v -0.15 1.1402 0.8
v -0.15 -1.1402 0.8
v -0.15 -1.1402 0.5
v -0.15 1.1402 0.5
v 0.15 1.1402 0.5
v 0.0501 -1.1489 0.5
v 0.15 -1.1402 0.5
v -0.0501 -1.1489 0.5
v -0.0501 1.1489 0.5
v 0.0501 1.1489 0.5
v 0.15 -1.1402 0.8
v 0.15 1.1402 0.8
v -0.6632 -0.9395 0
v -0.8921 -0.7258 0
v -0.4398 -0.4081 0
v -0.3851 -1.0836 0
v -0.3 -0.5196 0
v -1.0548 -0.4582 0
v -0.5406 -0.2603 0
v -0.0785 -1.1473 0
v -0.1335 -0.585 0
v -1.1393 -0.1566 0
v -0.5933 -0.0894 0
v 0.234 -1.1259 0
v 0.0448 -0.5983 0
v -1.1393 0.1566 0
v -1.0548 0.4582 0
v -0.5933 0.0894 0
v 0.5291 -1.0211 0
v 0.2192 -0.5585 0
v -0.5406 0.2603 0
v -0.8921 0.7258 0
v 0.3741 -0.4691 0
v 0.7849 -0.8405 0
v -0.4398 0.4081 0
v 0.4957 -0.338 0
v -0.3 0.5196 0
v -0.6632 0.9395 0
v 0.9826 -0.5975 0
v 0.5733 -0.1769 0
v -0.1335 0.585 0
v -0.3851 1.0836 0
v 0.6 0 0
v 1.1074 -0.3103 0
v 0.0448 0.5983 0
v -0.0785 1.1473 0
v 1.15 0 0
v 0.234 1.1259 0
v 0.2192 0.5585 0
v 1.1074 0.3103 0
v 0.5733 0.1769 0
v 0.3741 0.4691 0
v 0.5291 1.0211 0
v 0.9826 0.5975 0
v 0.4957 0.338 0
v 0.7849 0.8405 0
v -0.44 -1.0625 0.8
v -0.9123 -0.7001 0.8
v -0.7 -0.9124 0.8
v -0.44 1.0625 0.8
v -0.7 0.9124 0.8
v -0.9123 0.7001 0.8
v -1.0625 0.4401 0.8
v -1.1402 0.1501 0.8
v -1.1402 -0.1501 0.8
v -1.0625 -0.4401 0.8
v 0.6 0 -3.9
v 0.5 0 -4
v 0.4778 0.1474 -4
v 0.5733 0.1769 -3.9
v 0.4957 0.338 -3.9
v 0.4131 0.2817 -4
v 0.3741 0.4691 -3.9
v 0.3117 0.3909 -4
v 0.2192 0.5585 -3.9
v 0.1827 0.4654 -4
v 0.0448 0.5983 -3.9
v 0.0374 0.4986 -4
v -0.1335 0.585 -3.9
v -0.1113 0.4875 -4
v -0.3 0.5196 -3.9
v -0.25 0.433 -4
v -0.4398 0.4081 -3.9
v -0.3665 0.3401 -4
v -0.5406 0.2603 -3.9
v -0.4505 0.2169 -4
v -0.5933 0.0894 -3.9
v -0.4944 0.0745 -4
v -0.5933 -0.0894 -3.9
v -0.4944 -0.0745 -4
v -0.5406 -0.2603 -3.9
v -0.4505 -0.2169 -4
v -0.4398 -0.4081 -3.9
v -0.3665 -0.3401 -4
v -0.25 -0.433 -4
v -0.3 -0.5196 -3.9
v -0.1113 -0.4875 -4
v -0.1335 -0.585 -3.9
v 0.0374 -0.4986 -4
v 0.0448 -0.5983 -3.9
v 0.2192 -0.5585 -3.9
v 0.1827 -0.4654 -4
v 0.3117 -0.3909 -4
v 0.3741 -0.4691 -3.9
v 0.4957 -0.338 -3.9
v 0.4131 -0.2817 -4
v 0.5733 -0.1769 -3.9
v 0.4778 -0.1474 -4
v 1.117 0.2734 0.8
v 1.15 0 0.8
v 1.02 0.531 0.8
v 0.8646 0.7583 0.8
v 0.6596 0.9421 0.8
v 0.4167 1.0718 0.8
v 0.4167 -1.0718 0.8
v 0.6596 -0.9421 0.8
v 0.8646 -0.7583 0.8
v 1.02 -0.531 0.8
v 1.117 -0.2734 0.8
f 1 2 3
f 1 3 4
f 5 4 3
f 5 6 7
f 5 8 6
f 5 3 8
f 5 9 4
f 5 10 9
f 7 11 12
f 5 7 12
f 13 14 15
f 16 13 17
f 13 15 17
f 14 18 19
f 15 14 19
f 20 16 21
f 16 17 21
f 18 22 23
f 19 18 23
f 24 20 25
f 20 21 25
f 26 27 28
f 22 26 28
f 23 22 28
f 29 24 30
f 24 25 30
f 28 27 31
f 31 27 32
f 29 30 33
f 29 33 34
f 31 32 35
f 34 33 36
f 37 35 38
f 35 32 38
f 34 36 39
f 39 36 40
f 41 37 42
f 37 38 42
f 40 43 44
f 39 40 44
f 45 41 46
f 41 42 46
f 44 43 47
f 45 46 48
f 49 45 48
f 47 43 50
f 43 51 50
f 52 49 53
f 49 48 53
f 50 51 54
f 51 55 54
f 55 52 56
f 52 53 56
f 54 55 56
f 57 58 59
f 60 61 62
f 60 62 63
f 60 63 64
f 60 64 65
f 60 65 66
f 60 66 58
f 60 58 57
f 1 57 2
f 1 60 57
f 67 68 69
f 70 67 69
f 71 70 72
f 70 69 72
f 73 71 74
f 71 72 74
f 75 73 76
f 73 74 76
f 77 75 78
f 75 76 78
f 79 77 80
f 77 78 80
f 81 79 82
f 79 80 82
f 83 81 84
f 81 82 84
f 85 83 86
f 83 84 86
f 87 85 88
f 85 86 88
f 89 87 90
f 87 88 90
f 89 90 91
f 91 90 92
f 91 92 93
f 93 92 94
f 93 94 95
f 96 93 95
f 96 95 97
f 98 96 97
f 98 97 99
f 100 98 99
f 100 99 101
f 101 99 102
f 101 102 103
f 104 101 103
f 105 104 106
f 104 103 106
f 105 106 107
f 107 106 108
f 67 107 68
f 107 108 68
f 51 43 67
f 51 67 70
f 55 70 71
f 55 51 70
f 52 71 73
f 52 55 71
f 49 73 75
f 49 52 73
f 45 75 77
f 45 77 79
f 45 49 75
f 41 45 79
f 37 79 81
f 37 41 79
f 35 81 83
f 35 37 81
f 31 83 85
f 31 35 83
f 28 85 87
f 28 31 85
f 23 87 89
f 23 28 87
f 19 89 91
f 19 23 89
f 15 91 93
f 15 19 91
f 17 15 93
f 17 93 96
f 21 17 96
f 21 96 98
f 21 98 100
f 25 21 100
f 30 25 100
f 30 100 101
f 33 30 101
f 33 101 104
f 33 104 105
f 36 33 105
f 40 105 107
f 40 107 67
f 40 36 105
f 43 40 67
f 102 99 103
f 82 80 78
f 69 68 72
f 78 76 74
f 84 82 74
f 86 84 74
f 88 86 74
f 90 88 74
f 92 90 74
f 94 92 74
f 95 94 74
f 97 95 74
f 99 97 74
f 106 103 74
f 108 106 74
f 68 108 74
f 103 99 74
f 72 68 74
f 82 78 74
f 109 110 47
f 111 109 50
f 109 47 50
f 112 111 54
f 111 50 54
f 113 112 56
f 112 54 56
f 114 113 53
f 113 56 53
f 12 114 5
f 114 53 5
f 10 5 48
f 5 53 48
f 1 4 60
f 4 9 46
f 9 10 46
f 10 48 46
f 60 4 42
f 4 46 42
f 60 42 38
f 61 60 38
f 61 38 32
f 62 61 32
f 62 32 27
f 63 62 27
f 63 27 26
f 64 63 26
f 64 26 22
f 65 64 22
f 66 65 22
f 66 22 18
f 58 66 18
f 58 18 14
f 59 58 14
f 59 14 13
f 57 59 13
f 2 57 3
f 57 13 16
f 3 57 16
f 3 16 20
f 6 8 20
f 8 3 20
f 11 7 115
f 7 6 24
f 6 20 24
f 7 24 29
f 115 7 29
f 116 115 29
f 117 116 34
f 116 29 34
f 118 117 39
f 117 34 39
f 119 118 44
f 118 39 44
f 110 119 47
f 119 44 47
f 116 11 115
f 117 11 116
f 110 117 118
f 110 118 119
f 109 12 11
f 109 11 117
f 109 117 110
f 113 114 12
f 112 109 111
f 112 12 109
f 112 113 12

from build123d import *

# Parameters (mm, degrees)
SKETCH_1_R          = 1.15
EXTRUDE_1_DEPTH     = 0.8
SKETCH_2_R          = 0.6
EXTRUDE_2_DEPTH     = 4
CHAMFER_1_SIZE      = 0.1
SKETCH_3_W          = 0.3
SKETCH_3_H          = 2.389220408
CUT_EXTRUDE_1_DEPTH = 0.3


with BuildPart() as part:
    # Эскиз1 → Бобышка-Вытянуть1 (new body)
    with BuildSketch(Plane.XY):
        Circle(SKETCH_1_R)
    extrude(amount=EXTRUDE_1_DEPTH)

    # Эскиз2 → Бобышка-Вытянуть2 (add)
    with BuildSketch(Plane.XY):
        Circle(SKETCH_2_R)
    extrude(amount=-EXTRUDE_2_DEPTH)

    # Фаска1
    chamfer_1_edges = [part.edges().sort_by_distance(p)[0] for p in [
        (-0.6, 0, -4),
    ]]
    chamfer(chamfer_1_edges, length=CHAMFER_1_SIZE)

    # Эскиз3 → Вырез-Вытянуть1 (cut)
    with BuildSketch(Plane.XY.offset(0.8)):
        Rectangle(SKETCH_3_W, SKETCH_3_H)
    extrude(amount=-CUT_EXTRUDE_1_DEPTH, mode=Mode.SUBTRACT)


solid = part.part
